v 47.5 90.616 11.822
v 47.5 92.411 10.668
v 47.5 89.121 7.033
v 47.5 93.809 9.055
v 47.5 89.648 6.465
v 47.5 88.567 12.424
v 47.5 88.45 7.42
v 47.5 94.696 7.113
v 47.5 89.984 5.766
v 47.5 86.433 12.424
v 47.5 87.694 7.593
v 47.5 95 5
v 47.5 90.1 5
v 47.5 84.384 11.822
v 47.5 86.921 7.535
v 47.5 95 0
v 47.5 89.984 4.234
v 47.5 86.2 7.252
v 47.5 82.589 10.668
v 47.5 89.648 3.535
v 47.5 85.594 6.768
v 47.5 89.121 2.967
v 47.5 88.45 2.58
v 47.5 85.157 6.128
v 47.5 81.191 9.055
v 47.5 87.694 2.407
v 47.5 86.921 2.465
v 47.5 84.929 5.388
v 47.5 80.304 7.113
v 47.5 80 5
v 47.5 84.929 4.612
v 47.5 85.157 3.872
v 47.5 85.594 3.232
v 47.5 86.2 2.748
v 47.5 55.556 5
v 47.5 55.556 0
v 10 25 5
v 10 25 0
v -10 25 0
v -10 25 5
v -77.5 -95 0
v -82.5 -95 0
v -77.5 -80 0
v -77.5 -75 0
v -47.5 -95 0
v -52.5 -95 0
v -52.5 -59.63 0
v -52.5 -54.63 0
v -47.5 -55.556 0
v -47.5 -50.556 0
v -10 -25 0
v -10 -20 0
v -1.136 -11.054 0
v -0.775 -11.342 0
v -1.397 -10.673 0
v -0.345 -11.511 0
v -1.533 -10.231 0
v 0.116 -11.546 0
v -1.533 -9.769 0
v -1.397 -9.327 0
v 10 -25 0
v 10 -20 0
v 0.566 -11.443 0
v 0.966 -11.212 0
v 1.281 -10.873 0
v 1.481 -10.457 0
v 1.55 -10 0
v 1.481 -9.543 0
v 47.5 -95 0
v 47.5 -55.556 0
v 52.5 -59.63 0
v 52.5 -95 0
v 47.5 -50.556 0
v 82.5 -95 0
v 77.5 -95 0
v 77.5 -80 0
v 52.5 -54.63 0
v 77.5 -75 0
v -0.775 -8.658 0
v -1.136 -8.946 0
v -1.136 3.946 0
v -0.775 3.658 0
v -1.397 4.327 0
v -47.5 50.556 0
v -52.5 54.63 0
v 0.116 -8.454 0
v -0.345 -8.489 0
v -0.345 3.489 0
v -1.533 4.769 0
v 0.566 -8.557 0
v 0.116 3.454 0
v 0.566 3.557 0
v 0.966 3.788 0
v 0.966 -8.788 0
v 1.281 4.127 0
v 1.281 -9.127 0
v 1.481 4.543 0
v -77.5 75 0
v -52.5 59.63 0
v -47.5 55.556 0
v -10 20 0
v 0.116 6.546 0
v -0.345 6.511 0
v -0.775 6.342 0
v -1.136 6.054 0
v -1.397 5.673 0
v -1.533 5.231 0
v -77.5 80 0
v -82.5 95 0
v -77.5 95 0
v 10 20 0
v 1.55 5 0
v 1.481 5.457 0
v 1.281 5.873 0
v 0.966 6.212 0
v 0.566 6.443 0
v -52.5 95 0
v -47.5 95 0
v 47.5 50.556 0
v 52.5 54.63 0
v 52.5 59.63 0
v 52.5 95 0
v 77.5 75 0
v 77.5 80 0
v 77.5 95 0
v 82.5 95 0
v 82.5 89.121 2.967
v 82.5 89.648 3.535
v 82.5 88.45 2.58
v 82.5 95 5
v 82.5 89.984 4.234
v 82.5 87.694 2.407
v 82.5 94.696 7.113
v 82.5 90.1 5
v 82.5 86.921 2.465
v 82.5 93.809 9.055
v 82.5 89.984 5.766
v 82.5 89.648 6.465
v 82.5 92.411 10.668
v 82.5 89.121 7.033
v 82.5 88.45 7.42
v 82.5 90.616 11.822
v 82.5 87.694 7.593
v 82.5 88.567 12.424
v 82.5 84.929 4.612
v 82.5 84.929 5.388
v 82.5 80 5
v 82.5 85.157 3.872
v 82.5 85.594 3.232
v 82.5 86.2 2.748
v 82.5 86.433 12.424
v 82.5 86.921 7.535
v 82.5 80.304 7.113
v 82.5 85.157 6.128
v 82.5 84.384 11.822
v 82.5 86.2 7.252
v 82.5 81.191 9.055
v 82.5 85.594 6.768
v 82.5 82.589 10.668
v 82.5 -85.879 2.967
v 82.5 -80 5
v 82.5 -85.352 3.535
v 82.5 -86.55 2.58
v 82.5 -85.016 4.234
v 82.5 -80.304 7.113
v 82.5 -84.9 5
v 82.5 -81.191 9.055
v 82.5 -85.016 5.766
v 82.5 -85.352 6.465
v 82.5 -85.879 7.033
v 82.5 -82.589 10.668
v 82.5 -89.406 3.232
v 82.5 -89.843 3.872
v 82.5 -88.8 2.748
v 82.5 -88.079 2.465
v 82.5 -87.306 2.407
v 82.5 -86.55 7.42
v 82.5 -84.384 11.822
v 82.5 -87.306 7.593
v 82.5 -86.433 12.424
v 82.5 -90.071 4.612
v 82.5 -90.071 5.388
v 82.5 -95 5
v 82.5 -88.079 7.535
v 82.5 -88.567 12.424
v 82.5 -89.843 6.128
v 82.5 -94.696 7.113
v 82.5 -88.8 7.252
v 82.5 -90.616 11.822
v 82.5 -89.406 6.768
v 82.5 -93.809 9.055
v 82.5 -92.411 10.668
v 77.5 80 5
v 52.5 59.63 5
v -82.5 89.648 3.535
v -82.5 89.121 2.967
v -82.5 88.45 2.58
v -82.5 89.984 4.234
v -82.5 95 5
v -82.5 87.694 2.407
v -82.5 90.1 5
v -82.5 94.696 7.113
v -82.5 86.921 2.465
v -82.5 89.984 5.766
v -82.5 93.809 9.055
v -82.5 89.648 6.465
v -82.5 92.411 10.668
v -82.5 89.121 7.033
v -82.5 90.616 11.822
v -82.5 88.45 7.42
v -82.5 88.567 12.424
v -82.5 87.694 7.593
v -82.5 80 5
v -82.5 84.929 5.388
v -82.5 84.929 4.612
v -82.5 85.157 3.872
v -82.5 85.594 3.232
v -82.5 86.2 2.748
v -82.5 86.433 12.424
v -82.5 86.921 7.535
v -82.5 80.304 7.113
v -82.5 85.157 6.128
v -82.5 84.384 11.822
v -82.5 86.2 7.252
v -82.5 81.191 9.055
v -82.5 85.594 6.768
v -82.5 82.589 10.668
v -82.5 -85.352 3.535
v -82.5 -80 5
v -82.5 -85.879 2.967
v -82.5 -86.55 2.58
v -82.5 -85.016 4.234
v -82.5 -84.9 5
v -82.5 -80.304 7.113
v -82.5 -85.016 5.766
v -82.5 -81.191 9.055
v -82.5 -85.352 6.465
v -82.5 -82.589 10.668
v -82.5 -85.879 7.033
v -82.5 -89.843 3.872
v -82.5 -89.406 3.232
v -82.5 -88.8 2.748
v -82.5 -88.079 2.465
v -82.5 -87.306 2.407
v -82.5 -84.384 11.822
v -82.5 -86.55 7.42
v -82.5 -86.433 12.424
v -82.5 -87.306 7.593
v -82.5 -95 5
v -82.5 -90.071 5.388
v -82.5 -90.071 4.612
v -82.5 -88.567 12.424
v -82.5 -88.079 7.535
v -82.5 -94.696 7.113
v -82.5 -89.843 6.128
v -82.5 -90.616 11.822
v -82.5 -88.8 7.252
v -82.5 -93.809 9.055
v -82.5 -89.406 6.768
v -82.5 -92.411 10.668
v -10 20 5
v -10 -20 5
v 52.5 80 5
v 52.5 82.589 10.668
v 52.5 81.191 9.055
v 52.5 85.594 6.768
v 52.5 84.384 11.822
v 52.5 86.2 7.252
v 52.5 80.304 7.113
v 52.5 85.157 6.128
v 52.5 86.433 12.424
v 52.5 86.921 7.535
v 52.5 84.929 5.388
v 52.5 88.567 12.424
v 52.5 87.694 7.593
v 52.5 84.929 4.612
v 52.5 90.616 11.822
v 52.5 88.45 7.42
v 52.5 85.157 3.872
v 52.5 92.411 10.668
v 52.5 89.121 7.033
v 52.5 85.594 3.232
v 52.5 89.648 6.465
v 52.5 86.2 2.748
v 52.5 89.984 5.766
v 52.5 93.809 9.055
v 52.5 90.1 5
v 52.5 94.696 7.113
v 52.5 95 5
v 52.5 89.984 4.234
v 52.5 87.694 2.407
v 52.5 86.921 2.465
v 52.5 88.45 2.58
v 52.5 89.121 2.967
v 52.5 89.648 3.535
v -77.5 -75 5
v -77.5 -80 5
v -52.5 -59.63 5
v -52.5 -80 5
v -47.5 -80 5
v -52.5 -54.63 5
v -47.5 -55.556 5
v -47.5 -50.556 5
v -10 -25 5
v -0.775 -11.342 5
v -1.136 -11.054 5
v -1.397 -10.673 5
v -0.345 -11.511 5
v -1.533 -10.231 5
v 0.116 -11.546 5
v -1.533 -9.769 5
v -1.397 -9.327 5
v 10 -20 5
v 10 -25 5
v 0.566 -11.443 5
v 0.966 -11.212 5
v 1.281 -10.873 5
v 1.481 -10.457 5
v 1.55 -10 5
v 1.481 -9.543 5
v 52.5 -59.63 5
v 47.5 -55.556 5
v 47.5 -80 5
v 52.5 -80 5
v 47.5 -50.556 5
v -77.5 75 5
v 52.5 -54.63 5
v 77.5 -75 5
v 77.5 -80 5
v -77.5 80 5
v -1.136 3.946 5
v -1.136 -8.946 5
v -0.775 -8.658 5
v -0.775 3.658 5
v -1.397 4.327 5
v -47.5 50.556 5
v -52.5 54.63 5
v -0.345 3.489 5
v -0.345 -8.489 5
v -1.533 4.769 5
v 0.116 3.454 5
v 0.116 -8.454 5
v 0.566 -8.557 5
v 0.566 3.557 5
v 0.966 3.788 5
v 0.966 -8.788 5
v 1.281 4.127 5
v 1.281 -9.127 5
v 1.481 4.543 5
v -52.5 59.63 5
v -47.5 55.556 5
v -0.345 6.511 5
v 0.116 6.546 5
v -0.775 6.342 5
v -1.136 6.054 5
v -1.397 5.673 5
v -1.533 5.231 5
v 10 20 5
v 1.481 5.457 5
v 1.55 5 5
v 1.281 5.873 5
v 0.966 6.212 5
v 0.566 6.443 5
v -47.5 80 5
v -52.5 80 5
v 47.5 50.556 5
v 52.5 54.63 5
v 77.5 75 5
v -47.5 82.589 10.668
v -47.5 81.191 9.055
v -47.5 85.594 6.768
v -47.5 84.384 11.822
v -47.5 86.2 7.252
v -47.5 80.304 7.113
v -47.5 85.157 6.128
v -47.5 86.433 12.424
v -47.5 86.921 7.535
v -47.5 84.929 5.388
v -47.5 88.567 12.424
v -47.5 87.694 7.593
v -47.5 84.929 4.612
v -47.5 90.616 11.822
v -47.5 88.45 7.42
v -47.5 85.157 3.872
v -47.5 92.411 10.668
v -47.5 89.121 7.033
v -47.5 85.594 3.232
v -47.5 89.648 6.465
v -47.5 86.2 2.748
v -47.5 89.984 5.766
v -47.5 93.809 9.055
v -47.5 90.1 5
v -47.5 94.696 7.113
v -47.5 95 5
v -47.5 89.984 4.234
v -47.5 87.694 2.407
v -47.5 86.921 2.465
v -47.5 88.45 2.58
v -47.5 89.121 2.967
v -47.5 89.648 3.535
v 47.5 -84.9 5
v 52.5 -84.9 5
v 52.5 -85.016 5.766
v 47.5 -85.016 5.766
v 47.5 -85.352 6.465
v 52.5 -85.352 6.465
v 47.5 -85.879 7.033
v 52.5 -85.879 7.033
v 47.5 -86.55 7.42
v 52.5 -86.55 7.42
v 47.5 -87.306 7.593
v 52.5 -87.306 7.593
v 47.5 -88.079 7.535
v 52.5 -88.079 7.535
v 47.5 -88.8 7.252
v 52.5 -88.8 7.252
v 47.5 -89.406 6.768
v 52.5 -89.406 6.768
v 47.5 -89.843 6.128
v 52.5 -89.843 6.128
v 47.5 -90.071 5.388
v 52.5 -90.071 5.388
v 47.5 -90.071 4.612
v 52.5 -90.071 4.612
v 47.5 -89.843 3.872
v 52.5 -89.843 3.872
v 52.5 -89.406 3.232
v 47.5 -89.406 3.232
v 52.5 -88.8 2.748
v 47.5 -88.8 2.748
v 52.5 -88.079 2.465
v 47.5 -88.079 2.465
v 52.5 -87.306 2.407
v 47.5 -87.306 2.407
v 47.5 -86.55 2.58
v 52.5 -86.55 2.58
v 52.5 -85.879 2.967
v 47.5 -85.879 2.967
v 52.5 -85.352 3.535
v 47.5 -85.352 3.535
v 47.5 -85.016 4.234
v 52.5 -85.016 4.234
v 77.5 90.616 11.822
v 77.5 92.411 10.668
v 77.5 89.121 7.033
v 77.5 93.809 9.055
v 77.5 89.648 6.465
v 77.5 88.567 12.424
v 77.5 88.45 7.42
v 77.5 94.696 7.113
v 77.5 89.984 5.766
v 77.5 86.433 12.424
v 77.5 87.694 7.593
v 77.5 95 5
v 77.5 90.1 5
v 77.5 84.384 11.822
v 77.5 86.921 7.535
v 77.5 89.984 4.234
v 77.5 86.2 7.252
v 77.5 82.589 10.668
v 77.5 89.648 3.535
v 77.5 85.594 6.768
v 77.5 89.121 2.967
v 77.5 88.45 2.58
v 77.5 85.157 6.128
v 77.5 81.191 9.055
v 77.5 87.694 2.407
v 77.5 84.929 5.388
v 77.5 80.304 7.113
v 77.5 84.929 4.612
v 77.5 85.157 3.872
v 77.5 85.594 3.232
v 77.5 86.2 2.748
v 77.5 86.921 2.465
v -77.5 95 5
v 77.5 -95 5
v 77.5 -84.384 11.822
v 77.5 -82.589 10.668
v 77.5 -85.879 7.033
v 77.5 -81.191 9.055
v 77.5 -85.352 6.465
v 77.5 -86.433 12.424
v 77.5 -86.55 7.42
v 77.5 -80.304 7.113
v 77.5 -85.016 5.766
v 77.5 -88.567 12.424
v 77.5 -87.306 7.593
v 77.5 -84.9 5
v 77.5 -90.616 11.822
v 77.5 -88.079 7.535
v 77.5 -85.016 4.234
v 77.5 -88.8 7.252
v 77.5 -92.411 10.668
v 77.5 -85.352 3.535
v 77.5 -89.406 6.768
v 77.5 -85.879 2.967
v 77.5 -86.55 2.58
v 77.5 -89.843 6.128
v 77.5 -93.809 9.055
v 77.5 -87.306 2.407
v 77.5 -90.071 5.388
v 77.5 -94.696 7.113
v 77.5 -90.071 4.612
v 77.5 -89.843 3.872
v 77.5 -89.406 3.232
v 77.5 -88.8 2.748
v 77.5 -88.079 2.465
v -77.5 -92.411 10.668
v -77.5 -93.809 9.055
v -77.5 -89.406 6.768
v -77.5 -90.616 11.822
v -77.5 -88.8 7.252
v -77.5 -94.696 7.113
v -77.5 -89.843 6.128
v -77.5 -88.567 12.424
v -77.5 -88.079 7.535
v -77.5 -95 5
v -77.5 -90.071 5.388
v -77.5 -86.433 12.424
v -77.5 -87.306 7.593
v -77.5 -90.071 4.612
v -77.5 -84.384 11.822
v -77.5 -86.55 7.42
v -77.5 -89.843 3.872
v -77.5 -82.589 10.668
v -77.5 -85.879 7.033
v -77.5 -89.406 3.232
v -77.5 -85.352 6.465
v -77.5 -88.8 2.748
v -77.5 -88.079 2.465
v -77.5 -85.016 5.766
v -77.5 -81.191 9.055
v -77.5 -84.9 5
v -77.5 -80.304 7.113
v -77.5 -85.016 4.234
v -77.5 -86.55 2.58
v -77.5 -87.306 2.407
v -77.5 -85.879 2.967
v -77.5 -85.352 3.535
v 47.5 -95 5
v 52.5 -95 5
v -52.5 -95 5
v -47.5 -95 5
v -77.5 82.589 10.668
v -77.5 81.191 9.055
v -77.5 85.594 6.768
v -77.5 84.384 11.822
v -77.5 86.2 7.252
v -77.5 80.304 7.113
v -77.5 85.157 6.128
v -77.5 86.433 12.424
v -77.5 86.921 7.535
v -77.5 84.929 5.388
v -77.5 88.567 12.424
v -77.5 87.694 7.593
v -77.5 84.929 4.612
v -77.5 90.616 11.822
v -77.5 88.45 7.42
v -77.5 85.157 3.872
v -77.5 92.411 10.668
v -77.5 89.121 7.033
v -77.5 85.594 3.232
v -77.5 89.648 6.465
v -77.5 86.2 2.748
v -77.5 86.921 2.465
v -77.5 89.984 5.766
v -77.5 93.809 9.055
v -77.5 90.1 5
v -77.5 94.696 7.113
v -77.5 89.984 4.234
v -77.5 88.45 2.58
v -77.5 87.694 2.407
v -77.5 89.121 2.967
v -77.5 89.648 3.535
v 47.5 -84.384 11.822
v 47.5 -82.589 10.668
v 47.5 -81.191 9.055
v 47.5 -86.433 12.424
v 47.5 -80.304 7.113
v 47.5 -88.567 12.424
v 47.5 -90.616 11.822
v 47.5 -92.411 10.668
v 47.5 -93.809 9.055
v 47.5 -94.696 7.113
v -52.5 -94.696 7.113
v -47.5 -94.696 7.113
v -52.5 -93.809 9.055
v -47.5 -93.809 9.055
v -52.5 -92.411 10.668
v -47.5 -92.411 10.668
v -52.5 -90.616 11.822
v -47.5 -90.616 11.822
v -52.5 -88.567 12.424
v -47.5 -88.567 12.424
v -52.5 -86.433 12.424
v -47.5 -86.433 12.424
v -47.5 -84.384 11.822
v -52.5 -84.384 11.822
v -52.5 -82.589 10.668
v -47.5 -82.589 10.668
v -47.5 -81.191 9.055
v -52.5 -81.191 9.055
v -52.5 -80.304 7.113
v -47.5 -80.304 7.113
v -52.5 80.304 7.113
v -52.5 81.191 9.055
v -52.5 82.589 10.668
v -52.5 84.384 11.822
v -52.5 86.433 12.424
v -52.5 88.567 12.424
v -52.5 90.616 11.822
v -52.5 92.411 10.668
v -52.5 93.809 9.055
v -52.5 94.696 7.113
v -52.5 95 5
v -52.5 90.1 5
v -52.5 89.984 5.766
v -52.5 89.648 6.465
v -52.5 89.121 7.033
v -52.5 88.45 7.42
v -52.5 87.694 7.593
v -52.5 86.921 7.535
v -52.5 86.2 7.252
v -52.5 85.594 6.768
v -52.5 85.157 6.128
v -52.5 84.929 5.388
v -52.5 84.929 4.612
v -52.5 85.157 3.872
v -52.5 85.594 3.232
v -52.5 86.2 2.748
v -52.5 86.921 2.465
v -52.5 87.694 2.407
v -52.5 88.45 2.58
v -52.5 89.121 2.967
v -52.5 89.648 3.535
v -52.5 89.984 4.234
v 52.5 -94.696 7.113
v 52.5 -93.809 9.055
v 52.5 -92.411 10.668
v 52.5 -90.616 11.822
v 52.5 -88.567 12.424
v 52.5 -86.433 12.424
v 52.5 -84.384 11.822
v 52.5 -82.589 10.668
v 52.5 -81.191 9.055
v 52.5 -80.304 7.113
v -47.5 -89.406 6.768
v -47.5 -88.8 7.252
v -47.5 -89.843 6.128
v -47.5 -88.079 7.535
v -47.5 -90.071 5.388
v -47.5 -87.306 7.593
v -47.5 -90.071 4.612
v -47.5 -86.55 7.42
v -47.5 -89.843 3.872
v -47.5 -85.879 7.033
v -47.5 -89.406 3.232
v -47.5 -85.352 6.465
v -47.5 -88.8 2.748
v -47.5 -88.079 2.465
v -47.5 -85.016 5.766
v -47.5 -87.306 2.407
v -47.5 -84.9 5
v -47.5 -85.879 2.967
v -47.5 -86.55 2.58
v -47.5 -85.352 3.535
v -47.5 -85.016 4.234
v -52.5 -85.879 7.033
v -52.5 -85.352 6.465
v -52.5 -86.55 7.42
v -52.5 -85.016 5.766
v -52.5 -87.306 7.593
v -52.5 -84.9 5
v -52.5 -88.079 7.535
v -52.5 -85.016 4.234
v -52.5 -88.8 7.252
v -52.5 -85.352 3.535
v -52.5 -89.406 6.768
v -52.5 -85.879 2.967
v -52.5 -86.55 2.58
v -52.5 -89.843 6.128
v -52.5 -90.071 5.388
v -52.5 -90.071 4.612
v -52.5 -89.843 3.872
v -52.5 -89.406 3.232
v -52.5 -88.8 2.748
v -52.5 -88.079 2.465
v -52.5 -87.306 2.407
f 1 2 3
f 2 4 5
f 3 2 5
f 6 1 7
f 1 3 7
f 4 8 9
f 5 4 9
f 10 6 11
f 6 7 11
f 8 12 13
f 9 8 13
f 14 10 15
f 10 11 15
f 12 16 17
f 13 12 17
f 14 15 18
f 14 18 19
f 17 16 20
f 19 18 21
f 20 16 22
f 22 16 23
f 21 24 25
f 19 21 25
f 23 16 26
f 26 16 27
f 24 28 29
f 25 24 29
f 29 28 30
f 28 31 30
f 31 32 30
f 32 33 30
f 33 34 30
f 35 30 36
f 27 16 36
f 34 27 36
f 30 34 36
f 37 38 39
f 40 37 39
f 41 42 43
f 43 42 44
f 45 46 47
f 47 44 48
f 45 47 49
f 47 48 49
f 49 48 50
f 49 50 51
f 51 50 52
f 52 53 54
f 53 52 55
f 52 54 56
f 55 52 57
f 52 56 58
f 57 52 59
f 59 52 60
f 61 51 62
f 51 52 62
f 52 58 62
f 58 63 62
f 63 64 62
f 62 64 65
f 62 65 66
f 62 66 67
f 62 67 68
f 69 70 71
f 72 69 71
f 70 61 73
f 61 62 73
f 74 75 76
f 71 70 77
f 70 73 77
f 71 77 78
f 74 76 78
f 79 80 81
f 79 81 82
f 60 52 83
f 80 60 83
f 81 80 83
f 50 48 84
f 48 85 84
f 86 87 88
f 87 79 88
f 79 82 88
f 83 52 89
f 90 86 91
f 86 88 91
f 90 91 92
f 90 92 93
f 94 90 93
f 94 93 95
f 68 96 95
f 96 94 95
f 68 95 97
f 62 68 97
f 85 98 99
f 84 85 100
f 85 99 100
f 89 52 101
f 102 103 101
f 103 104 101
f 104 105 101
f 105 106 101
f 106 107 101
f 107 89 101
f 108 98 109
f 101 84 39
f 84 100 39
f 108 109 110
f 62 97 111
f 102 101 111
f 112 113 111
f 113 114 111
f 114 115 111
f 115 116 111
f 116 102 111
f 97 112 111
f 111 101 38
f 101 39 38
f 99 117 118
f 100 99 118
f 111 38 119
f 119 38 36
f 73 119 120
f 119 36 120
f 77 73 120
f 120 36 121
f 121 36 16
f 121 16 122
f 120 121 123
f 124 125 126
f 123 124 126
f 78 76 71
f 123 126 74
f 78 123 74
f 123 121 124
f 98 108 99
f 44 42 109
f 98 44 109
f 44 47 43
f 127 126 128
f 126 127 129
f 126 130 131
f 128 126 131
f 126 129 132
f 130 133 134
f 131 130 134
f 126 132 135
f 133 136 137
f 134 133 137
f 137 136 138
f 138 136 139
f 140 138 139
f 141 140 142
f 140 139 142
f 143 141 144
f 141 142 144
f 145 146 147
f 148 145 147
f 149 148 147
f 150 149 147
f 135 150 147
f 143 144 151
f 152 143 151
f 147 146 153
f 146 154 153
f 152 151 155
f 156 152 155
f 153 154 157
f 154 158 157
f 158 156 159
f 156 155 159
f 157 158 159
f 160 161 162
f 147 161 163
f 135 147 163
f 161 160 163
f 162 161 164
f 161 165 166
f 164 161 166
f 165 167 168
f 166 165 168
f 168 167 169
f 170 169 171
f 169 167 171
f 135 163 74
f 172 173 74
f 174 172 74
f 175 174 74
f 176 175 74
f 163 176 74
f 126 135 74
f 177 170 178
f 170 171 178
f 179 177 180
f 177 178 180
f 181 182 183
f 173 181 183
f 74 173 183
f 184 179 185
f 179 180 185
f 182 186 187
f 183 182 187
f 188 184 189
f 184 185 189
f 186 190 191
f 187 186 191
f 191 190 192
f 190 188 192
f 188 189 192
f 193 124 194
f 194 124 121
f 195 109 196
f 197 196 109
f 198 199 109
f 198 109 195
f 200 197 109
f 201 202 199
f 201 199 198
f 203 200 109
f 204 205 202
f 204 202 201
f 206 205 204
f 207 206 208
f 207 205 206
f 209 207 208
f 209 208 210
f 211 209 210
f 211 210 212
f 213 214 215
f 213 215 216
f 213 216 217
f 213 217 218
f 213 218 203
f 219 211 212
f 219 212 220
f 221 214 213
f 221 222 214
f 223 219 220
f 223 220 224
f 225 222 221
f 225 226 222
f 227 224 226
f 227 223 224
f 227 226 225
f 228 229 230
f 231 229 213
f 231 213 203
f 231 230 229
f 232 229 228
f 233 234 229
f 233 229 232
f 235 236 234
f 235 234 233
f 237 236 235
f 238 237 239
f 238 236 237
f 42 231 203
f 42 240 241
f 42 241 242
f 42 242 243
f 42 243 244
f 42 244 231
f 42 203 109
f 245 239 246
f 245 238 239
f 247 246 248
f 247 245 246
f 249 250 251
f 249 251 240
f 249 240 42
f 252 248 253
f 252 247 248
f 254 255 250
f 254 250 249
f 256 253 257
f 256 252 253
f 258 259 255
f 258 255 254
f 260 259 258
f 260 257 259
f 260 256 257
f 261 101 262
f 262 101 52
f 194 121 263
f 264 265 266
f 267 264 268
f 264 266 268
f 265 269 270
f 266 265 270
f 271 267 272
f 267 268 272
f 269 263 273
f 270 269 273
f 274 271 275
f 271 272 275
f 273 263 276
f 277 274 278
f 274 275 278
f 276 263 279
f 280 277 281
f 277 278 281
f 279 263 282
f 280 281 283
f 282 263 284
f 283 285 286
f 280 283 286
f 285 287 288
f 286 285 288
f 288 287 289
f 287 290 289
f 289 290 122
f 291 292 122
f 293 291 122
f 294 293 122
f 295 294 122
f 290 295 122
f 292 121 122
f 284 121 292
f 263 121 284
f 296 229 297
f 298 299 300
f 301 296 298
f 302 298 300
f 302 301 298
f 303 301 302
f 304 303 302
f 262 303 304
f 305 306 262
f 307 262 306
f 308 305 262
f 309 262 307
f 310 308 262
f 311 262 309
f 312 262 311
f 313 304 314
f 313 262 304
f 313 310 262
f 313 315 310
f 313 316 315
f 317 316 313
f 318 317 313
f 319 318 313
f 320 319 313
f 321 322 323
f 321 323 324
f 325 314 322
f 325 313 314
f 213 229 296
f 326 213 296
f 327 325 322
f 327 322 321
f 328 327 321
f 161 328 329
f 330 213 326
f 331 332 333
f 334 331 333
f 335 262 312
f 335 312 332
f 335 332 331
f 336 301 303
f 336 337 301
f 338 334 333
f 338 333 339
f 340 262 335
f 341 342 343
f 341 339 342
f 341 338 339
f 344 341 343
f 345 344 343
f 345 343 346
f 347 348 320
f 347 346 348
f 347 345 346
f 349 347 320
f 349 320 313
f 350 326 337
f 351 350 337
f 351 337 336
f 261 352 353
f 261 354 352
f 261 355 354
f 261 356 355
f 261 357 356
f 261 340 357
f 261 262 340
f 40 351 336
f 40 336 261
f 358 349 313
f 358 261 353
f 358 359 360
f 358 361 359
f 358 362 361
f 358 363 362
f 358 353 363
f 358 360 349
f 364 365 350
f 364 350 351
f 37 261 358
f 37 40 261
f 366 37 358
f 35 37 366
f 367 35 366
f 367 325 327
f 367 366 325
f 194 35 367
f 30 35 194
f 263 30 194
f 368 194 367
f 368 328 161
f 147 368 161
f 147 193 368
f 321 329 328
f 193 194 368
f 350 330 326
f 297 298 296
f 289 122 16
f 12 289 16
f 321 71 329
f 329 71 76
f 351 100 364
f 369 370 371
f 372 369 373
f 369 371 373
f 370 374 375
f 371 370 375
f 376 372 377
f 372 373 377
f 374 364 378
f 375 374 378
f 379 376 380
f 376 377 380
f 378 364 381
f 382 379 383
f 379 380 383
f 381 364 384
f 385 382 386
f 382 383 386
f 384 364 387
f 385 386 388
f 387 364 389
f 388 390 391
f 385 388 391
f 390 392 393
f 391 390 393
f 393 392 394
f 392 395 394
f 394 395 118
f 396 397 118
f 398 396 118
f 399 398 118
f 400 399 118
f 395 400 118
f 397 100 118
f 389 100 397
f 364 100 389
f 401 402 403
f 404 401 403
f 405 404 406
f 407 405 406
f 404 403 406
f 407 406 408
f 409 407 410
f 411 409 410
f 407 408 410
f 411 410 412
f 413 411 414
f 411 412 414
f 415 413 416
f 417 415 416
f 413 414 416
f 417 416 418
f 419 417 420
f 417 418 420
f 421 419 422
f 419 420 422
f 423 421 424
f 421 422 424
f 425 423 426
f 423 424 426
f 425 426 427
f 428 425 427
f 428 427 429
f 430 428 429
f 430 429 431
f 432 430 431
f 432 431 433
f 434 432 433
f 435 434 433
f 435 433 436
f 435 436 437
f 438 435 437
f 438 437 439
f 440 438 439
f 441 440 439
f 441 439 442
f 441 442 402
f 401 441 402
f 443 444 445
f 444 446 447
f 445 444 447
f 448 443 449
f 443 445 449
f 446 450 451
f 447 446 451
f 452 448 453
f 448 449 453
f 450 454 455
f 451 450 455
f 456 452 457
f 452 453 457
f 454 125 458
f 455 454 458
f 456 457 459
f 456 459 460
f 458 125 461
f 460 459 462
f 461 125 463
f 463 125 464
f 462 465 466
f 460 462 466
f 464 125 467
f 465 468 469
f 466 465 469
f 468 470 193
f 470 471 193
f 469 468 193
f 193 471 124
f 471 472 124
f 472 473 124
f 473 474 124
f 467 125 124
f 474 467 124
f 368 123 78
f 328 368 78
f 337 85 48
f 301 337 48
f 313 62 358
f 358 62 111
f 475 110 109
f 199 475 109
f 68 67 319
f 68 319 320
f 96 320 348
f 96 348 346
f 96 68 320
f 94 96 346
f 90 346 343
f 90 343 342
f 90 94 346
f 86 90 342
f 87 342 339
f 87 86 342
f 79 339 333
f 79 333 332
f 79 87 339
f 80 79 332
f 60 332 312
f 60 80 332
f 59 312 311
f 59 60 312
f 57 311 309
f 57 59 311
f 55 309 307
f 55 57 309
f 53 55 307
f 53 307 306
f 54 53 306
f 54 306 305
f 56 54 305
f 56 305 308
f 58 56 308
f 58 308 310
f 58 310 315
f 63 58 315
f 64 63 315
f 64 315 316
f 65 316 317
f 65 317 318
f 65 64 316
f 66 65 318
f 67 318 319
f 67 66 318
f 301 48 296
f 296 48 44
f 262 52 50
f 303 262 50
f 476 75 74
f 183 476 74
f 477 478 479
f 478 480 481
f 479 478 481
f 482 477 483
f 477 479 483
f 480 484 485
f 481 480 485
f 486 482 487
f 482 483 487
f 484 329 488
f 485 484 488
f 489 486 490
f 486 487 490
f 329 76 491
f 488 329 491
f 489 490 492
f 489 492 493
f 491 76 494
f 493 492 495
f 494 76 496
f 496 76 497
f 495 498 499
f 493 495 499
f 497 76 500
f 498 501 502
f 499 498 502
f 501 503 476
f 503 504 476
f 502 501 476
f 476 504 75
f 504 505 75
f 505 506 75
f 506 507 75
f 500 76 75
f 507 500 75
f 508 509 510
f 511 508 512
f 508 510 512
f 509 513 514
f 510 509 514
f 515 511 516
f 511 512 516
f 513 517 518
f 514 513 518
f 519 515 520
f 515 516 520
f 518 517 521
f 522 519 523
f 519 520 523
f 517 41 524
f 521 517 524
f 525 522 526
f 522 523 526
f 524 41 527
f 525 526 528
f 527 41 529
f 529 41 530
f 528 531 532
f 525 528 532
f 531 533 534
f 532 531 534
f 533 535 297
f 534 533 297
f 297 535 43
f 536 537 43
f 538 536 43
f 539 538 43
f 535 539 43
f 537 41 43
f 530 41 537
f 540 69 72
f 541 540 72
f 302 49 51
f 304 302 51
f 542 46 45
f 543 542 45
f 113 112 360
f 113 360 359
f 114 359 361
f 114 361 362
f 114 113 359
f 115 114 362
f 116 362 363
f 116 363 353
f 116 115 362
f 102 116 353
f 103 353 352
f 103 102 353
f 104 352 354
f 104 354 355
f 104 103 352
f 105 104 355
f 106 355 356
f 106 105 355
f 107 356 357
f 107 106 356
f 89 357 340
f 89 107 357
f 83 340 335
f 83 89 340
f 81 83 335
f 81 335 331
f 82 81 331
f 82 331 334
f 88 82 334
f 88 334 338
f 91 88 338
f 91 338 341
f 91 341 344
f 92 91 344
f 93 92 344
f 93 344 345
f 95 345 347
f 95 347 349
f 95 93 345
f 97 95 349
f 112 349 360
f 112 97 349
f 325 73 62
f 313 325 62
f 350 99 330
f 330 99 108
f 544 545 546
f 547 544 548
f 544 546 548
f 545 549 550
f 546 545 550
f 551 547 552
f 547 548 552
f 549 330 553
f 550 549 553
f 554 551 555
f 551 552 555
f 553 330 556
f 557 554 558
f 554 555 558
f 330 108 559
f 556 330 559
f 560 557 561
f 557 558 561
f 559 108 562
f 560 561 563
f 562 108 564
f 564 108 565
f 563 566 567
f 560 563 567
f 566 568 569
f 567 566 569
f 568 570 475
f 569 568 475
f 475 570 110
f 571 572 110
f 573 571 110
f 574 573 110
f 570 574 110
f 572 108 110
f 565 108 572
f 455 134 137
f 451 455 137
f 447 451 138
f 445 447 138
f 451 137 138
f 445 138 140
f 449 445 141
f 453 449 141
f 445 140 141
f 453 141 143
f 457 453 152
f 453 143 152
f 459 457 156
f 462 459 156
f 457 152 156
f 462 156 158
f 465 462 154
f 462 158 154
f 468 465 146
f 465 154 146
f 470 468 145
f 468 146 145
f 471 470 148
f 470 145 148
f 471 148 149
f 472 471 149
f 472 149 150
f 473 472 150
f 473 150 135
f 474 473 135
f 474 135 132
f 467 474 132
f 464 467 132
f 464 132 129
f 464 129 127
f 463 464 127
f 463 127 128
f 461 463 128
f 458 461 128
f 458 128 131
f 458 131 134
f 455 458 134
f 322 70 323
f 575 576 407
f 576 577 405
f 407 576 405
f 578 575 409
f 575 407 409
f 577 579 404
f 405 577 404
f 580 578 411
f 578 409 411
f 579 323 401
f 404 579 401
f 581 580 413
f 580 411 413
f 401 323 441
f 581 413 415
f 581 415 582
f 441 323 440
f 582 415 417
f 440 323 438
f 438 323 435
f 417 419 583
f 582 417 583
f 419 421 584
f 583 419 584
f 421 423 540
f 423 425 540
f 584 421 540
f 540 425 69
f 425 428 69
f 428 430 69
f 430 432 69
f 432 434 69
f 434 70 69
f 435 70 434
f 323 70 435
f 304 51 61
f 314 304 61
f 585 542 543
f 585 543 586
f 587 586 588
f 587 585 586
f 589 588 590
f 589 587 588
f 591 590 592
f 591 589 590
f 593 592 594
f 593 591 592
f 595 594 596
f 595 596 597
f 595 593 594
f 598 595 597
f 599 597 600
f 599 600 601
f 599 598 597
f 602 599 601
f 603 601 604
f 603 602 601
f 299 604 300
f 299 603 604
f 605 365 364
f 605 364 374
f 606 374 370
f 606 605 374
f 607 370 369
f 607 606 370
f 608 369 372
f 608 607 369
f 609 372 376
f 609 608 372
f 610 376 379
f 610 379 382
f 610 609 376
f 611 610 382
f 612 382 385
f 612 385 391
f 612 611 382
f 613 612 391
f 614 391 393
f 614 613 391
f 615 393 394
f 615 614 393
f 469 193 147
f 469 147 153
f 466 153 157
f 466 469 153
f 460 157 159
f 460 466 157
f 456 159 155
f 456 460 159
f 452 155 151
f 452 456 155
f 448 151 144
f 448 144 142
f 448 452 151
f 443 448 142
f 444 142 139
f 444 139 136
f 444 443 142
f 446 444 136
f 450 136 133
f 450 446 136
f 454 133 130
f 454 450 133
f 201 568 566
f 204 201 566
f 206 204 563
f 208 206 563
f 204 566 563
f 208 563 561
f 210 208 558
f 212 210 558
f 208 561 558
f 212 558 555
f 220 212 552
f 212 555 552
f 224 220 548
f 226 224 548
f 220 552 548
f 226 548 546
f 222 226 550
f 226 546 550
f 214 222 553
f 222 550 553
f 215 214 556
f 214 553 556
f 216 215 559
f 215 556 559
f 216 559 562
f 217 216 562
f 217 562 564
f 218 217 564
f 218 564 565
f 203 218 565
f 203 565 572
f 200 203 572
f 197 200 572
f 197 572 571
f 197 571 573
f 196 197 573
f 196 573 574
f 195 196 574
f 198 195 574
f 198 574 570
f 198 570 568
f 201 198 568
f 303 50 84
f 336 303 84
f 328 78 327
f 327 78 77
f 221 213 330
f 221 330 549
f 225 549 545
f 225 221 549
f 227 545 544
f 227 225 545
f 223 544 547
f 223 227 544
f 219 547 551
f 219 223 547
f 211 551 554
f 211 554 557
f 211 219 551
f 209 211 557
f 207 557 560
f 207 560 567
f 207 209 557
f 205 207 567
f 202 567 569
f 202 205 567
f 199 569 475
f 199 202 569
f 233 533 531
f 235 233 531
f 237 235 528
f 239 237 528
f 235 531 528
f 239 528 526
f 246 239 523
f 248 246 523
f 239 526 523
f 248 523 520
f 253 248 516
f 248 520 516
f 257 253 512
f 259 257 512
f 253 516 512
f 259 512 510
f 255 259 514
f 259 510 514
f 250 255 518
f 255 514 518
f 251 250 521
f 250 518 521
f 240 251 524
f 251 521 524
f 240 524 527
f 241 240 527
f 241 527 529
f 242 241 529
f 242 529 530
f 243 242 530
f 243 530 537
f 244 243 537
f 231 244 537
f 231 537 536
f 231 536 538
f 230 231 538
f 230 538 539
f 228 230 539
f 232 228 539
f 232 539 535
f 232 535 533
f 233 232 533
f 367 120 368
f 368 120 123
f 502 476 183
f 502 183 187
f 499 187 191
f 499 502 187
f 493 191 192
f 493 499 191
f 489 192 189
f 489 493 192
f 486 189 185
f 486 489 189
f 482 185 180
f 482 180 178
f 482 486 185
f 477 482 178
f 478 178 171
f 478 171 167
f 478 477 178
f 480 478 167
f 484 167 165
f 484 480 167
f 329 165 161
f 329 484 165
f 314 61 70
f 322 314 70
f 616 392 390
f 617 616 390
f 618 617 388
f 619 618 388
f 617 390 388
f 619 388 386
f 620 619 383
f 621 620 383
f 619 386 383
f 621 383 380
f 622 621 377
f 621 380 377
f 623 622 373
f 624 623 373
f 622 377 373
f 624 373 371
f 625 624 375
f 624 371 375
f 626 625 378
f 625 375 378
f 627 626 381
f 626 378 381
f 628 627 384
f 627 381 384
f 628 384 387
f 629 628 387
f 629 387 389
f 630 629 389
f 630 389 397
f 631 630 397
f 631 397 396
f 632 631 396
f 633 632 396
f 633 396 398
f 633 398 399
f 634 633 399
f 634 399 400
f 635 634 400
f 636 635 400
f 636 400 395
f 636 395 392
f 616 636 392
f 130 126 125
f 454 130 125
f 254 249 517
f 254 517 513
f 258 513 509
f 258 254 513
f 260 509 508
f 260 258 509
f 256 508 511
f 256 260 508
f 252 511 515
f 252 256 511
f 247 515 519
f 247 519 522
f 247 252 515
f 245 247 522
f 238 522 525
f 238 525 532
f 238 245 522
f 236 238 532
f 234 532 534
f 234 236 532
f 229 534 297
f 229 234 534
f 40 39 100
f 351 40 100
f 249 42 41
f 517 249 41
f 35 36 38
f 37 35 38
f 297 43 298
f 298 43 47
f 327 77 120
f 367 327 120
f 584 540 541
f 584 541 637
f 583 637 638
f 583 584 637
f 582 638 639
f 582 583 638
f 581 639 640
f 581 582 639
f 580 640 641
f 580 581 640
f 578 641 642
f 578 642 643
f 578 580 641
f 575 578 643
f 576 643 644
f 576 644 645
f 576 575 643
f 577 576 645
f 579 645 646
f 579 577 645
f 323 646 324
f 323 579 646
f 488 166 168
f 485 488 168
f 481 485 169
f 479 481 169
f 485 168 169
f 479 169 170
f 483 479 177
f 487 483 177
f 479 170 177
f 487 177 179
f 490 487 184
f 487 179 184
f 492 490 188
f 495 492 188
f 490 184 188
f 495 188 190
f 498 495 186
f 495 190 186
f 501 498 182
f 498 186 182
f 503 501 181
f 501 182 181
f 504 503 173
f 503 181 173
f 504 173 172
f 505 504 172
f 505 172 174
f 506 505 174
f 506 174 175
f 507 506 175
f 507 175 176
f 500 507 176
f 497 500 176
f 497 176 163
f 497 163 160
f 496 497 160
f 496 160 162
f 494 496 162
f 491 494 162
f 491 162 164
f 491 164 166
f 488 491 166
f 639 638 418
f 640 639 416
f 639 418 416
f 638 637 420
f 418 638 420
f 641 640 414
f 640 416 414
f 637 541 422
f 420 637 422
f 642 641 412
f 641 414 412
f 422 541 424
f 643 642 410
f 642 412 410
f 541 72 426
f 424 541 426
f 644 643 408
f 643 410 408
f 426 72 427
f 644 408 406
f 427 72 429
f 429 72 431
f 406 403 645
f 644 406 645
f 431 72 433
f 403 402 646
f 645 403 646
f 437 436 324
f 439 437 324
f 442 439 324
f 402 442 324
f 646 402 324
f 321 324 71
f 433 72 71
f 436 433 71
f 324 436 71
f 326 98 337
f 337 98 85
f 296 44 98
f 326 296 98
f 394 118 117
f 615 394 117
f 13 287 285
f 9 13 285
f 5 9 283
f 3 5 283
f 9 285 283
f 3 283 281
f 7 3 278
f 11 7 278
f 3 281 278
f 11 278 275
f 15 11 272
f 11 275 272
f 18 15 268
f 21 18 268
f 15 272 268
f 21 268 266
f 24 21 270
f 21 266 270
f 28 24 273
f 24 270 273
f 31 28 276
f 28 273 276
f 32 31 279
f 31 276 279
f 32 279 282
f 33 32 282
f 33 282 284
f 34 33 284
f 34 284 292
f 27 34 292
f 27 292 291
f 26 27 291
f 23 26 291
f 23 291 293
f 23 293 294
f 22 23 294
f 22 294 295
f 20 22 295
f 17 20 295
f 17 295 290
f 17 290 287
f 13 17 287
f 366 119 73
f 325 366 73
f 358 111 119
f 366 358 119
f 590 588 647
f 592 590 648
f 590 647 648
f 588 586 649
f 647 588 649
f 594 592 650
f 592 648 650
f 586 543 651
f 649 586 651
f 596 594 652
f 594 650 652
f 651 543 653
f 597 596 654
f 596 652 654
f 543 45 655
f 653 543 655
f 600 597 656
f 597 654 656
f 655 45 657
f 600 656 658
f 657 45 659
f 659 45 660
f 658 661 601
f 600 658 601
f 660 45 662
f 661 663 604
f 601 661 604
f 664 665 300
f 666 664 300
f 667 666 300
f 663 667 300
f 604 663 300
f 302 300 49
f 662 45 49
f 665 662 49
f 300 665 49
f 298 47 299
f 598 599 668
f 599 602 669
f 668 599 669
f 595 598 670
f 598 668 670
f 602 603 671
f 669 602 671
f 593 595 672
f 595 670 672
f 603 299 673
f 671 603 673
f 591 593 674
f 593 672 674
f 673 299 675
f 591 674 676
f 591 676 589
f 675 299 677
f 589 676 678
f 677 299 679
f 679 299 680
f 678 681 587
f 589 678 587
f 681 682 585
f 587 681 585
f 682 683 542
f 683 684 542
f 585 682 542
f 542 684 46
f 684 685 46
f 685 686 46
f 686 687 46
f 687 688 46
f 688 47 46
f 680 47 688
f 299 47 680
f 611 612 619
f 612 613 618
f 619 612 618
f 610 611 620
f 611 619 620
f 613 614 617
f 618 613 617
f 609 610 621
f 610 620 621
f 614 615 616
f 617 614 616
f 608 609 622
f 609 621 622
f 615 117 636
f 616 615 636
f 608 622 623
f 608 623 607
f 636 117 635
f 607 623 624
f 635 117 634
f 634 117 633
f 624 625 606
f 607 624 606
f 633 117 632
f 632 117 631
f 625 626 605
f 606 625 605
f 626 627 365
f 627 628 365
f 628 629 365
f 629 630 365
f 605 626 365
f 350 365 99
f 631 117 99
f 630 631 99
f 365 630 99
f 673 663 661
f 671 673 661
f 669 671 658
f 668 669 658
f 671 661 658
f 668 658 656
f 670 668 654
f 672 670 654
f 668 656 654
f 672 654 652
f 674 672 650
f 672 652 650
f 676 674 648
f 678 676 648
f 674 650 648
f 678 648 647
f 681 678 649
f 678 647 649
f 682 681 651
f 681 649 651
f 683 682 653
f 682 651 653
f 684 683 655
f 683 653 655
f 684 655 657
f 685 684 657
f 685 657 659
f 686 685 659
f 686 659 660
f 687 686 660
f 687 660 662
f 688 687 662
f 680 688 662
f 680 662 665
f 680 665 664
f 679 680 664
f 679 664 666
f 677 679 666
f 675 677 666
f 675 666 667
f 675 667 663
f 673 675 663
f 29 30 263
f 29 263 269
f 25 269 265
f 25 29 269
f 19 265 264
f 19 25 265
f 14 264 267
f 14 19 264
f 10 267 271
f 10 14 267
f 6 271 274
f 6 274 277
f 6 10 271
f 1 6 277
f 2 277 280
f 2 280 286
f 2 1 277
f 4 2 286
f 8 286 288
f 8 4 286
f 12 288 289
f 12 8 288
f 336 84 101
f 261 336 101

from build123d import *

# Parameters (mm, degrees)
F0_R     = 1.55
F1_DEPTH = 5
F3_DEPTH = 165
F4_DEPTH = 25
F5_R     = 2.6
F6_DEPTH = 165.001


with BuildPart() as f1:
    # F0 (on Top) → F1 (new body)
    with BuildSketch(Plane.XY):
        Polygon((-10, -25), (10, -25), (10, -20), (10, 20), (10, 25), (-10, 25), (-10, 20), (-10, -20), align=None)
        with Locations((0, -10)):
            Circle(F0_R, mode=Mode.SUBTRACT)
        with Locations((0, 5)):
            Circle(F0_R, mode=Mode.SUBTRACT)
        Polygon((10, -20), (10, -25), (47.5, -55.5555555556), (47.5, -50.5555555556), align=None)
        Polygon((-47.5, -55.5555555556), (-10, -25), (-10, -20), (-47.5, -50.5555555556), align=None)
        Polygon((52.5, -59.6296296296), (47.5, -55.5555555556), (47.5, -95), (52.5, -95), align=None)
        Polygon((47.5, -50.5555555556), (47.5, -55.5555555556), (52.5, -59.6296296296), (52.5, -54.6296296296), align=None)
        Polygon((-52.5, -59.6296296296), (-47.5, -55.5555555556), (-47.5, -50.5555555556), (-52.5, -54.6296296296), align=None)
        Polygon((-47.5, -95), (-47.5, -55.5555555556), (-52.5, -59.6296296296), (-52.5, -95), align=None)
        Polygon((10, 25), (10, 20), (47.5, 50.5555555556), (47.5, 55.5555555556), align=None)
        Polygon((52.5, -54.6296296296), (52.5, -59.6296296296), (77.5, -80), (77.5, -75), align=None)
        Polygon((-47.5, 50.5555555556), (-10, 20), (-10, 25), (-47.5, 55.5555555556), align=None)
        Polygon((-77.5, -80), (-52.5, -59.6296296296), (-52.5, -54.6296296296), (-77.5, -75), align=None)
        Polygon((47.5, 55.5555555556), (47.5, 50.5555555556), (52.5, 54.6296296296), (52.5, 59.6296296296), align=None)
        Polygon((77.5, -75), (77.5, -80), (77.5, -95), (82.5, -95), (82.5, 95), (77.5, 95), (77.5, 80), (77.5, 75), align=None)
        Polygon((-52.5, 54.6296296296), (-47.5, 50.5555555556), (-47.5, 55.5555555556), (-52.5, 59.6296296296), align=None)
        Polygon((-77.5, -95), (-77.5, -80), (-77.5, -75), (-77.5, 75), (-77.5, 80), (-77.5, 95), (-82.5, 95), (-82.5, -95), align=None)
        Polygon((47.5, 95), (47.5, 55.5555555556), (52.5, 59.6296296296), (52.5, 95), align=None)
        Polygon((52.5, 59.6296296296), (52.5, 54.6296296296), (77.5, 75), (77.5, 80), align=None)
        Polygon((-52.5, 59.6296296296), (-47.5, 55.5555555556), (-47.5, 95), (-52.5, 95), align=None)
        Polygon((-77.5, 75), (-52.5, 54.6296296296), (-52.5, 59.6296296296), (-77.5, 80), align=None)
        Polygon((-52.5, -54.6296296296), (-47.5, -50.5555555556), (-47.5, 50.5555555556), (-52.5, 54.6296296296), align=None)
        Polygon((47.5, 50.5555555556), (47.5, -50.5555555556), (52.5, -54.6296296296), (52.5, 54.6296296296), align=None)
    extrude(amount=F1_DEPTH)

    # F2 (on face) → F3 (join, through all)
    with BuildSketch(Plane(origin=(-82.5, 0, 0), x_dir=(0, -1, 0), z_dir=(-1, 0, 0))):
        with BuildLine():
            Line((-95, 5), (-80, 5))
            ThreePointArc((-80, 5), (-87.5, 12.5), (-95, 5))
        make_face()
        with BuildLine():
            Line((80, 5), (95, 5))
            ThreePointArc((95, 5), (87.5, 12.5), (80, 5))
        make_face()
    extrude(amount=-F3_DEPTH)

    # F4 (cut): faces of the model
    f4_faces = [f1.faces().sort_by_distance(p)[0] for p in [
        (65, 87.5, 5),
        (0, 87.5, 5),
        (-65, 87.5, 5),
        (-65, -87.5, 5),
        (0, -87.5, 5),
        (65, -87.5, 5),
    ]]
    extrude(f4_faces, amount=-F4_DEPTH, mode=Mode.SUBTRACT)

    # F5 (on face) → F6 (cut, through all)
    with BuildSketch(Plane.YZ.offset(82.5)):
        with Locations((-87.5, 5)):
            Circle(F5_R)
        with Locations((87.5, 5)):
            Circle(F5_R)
    extrude(amount=-F6_DEPTH, mode=Mode.SUBTRACT)


solid = f1.part
